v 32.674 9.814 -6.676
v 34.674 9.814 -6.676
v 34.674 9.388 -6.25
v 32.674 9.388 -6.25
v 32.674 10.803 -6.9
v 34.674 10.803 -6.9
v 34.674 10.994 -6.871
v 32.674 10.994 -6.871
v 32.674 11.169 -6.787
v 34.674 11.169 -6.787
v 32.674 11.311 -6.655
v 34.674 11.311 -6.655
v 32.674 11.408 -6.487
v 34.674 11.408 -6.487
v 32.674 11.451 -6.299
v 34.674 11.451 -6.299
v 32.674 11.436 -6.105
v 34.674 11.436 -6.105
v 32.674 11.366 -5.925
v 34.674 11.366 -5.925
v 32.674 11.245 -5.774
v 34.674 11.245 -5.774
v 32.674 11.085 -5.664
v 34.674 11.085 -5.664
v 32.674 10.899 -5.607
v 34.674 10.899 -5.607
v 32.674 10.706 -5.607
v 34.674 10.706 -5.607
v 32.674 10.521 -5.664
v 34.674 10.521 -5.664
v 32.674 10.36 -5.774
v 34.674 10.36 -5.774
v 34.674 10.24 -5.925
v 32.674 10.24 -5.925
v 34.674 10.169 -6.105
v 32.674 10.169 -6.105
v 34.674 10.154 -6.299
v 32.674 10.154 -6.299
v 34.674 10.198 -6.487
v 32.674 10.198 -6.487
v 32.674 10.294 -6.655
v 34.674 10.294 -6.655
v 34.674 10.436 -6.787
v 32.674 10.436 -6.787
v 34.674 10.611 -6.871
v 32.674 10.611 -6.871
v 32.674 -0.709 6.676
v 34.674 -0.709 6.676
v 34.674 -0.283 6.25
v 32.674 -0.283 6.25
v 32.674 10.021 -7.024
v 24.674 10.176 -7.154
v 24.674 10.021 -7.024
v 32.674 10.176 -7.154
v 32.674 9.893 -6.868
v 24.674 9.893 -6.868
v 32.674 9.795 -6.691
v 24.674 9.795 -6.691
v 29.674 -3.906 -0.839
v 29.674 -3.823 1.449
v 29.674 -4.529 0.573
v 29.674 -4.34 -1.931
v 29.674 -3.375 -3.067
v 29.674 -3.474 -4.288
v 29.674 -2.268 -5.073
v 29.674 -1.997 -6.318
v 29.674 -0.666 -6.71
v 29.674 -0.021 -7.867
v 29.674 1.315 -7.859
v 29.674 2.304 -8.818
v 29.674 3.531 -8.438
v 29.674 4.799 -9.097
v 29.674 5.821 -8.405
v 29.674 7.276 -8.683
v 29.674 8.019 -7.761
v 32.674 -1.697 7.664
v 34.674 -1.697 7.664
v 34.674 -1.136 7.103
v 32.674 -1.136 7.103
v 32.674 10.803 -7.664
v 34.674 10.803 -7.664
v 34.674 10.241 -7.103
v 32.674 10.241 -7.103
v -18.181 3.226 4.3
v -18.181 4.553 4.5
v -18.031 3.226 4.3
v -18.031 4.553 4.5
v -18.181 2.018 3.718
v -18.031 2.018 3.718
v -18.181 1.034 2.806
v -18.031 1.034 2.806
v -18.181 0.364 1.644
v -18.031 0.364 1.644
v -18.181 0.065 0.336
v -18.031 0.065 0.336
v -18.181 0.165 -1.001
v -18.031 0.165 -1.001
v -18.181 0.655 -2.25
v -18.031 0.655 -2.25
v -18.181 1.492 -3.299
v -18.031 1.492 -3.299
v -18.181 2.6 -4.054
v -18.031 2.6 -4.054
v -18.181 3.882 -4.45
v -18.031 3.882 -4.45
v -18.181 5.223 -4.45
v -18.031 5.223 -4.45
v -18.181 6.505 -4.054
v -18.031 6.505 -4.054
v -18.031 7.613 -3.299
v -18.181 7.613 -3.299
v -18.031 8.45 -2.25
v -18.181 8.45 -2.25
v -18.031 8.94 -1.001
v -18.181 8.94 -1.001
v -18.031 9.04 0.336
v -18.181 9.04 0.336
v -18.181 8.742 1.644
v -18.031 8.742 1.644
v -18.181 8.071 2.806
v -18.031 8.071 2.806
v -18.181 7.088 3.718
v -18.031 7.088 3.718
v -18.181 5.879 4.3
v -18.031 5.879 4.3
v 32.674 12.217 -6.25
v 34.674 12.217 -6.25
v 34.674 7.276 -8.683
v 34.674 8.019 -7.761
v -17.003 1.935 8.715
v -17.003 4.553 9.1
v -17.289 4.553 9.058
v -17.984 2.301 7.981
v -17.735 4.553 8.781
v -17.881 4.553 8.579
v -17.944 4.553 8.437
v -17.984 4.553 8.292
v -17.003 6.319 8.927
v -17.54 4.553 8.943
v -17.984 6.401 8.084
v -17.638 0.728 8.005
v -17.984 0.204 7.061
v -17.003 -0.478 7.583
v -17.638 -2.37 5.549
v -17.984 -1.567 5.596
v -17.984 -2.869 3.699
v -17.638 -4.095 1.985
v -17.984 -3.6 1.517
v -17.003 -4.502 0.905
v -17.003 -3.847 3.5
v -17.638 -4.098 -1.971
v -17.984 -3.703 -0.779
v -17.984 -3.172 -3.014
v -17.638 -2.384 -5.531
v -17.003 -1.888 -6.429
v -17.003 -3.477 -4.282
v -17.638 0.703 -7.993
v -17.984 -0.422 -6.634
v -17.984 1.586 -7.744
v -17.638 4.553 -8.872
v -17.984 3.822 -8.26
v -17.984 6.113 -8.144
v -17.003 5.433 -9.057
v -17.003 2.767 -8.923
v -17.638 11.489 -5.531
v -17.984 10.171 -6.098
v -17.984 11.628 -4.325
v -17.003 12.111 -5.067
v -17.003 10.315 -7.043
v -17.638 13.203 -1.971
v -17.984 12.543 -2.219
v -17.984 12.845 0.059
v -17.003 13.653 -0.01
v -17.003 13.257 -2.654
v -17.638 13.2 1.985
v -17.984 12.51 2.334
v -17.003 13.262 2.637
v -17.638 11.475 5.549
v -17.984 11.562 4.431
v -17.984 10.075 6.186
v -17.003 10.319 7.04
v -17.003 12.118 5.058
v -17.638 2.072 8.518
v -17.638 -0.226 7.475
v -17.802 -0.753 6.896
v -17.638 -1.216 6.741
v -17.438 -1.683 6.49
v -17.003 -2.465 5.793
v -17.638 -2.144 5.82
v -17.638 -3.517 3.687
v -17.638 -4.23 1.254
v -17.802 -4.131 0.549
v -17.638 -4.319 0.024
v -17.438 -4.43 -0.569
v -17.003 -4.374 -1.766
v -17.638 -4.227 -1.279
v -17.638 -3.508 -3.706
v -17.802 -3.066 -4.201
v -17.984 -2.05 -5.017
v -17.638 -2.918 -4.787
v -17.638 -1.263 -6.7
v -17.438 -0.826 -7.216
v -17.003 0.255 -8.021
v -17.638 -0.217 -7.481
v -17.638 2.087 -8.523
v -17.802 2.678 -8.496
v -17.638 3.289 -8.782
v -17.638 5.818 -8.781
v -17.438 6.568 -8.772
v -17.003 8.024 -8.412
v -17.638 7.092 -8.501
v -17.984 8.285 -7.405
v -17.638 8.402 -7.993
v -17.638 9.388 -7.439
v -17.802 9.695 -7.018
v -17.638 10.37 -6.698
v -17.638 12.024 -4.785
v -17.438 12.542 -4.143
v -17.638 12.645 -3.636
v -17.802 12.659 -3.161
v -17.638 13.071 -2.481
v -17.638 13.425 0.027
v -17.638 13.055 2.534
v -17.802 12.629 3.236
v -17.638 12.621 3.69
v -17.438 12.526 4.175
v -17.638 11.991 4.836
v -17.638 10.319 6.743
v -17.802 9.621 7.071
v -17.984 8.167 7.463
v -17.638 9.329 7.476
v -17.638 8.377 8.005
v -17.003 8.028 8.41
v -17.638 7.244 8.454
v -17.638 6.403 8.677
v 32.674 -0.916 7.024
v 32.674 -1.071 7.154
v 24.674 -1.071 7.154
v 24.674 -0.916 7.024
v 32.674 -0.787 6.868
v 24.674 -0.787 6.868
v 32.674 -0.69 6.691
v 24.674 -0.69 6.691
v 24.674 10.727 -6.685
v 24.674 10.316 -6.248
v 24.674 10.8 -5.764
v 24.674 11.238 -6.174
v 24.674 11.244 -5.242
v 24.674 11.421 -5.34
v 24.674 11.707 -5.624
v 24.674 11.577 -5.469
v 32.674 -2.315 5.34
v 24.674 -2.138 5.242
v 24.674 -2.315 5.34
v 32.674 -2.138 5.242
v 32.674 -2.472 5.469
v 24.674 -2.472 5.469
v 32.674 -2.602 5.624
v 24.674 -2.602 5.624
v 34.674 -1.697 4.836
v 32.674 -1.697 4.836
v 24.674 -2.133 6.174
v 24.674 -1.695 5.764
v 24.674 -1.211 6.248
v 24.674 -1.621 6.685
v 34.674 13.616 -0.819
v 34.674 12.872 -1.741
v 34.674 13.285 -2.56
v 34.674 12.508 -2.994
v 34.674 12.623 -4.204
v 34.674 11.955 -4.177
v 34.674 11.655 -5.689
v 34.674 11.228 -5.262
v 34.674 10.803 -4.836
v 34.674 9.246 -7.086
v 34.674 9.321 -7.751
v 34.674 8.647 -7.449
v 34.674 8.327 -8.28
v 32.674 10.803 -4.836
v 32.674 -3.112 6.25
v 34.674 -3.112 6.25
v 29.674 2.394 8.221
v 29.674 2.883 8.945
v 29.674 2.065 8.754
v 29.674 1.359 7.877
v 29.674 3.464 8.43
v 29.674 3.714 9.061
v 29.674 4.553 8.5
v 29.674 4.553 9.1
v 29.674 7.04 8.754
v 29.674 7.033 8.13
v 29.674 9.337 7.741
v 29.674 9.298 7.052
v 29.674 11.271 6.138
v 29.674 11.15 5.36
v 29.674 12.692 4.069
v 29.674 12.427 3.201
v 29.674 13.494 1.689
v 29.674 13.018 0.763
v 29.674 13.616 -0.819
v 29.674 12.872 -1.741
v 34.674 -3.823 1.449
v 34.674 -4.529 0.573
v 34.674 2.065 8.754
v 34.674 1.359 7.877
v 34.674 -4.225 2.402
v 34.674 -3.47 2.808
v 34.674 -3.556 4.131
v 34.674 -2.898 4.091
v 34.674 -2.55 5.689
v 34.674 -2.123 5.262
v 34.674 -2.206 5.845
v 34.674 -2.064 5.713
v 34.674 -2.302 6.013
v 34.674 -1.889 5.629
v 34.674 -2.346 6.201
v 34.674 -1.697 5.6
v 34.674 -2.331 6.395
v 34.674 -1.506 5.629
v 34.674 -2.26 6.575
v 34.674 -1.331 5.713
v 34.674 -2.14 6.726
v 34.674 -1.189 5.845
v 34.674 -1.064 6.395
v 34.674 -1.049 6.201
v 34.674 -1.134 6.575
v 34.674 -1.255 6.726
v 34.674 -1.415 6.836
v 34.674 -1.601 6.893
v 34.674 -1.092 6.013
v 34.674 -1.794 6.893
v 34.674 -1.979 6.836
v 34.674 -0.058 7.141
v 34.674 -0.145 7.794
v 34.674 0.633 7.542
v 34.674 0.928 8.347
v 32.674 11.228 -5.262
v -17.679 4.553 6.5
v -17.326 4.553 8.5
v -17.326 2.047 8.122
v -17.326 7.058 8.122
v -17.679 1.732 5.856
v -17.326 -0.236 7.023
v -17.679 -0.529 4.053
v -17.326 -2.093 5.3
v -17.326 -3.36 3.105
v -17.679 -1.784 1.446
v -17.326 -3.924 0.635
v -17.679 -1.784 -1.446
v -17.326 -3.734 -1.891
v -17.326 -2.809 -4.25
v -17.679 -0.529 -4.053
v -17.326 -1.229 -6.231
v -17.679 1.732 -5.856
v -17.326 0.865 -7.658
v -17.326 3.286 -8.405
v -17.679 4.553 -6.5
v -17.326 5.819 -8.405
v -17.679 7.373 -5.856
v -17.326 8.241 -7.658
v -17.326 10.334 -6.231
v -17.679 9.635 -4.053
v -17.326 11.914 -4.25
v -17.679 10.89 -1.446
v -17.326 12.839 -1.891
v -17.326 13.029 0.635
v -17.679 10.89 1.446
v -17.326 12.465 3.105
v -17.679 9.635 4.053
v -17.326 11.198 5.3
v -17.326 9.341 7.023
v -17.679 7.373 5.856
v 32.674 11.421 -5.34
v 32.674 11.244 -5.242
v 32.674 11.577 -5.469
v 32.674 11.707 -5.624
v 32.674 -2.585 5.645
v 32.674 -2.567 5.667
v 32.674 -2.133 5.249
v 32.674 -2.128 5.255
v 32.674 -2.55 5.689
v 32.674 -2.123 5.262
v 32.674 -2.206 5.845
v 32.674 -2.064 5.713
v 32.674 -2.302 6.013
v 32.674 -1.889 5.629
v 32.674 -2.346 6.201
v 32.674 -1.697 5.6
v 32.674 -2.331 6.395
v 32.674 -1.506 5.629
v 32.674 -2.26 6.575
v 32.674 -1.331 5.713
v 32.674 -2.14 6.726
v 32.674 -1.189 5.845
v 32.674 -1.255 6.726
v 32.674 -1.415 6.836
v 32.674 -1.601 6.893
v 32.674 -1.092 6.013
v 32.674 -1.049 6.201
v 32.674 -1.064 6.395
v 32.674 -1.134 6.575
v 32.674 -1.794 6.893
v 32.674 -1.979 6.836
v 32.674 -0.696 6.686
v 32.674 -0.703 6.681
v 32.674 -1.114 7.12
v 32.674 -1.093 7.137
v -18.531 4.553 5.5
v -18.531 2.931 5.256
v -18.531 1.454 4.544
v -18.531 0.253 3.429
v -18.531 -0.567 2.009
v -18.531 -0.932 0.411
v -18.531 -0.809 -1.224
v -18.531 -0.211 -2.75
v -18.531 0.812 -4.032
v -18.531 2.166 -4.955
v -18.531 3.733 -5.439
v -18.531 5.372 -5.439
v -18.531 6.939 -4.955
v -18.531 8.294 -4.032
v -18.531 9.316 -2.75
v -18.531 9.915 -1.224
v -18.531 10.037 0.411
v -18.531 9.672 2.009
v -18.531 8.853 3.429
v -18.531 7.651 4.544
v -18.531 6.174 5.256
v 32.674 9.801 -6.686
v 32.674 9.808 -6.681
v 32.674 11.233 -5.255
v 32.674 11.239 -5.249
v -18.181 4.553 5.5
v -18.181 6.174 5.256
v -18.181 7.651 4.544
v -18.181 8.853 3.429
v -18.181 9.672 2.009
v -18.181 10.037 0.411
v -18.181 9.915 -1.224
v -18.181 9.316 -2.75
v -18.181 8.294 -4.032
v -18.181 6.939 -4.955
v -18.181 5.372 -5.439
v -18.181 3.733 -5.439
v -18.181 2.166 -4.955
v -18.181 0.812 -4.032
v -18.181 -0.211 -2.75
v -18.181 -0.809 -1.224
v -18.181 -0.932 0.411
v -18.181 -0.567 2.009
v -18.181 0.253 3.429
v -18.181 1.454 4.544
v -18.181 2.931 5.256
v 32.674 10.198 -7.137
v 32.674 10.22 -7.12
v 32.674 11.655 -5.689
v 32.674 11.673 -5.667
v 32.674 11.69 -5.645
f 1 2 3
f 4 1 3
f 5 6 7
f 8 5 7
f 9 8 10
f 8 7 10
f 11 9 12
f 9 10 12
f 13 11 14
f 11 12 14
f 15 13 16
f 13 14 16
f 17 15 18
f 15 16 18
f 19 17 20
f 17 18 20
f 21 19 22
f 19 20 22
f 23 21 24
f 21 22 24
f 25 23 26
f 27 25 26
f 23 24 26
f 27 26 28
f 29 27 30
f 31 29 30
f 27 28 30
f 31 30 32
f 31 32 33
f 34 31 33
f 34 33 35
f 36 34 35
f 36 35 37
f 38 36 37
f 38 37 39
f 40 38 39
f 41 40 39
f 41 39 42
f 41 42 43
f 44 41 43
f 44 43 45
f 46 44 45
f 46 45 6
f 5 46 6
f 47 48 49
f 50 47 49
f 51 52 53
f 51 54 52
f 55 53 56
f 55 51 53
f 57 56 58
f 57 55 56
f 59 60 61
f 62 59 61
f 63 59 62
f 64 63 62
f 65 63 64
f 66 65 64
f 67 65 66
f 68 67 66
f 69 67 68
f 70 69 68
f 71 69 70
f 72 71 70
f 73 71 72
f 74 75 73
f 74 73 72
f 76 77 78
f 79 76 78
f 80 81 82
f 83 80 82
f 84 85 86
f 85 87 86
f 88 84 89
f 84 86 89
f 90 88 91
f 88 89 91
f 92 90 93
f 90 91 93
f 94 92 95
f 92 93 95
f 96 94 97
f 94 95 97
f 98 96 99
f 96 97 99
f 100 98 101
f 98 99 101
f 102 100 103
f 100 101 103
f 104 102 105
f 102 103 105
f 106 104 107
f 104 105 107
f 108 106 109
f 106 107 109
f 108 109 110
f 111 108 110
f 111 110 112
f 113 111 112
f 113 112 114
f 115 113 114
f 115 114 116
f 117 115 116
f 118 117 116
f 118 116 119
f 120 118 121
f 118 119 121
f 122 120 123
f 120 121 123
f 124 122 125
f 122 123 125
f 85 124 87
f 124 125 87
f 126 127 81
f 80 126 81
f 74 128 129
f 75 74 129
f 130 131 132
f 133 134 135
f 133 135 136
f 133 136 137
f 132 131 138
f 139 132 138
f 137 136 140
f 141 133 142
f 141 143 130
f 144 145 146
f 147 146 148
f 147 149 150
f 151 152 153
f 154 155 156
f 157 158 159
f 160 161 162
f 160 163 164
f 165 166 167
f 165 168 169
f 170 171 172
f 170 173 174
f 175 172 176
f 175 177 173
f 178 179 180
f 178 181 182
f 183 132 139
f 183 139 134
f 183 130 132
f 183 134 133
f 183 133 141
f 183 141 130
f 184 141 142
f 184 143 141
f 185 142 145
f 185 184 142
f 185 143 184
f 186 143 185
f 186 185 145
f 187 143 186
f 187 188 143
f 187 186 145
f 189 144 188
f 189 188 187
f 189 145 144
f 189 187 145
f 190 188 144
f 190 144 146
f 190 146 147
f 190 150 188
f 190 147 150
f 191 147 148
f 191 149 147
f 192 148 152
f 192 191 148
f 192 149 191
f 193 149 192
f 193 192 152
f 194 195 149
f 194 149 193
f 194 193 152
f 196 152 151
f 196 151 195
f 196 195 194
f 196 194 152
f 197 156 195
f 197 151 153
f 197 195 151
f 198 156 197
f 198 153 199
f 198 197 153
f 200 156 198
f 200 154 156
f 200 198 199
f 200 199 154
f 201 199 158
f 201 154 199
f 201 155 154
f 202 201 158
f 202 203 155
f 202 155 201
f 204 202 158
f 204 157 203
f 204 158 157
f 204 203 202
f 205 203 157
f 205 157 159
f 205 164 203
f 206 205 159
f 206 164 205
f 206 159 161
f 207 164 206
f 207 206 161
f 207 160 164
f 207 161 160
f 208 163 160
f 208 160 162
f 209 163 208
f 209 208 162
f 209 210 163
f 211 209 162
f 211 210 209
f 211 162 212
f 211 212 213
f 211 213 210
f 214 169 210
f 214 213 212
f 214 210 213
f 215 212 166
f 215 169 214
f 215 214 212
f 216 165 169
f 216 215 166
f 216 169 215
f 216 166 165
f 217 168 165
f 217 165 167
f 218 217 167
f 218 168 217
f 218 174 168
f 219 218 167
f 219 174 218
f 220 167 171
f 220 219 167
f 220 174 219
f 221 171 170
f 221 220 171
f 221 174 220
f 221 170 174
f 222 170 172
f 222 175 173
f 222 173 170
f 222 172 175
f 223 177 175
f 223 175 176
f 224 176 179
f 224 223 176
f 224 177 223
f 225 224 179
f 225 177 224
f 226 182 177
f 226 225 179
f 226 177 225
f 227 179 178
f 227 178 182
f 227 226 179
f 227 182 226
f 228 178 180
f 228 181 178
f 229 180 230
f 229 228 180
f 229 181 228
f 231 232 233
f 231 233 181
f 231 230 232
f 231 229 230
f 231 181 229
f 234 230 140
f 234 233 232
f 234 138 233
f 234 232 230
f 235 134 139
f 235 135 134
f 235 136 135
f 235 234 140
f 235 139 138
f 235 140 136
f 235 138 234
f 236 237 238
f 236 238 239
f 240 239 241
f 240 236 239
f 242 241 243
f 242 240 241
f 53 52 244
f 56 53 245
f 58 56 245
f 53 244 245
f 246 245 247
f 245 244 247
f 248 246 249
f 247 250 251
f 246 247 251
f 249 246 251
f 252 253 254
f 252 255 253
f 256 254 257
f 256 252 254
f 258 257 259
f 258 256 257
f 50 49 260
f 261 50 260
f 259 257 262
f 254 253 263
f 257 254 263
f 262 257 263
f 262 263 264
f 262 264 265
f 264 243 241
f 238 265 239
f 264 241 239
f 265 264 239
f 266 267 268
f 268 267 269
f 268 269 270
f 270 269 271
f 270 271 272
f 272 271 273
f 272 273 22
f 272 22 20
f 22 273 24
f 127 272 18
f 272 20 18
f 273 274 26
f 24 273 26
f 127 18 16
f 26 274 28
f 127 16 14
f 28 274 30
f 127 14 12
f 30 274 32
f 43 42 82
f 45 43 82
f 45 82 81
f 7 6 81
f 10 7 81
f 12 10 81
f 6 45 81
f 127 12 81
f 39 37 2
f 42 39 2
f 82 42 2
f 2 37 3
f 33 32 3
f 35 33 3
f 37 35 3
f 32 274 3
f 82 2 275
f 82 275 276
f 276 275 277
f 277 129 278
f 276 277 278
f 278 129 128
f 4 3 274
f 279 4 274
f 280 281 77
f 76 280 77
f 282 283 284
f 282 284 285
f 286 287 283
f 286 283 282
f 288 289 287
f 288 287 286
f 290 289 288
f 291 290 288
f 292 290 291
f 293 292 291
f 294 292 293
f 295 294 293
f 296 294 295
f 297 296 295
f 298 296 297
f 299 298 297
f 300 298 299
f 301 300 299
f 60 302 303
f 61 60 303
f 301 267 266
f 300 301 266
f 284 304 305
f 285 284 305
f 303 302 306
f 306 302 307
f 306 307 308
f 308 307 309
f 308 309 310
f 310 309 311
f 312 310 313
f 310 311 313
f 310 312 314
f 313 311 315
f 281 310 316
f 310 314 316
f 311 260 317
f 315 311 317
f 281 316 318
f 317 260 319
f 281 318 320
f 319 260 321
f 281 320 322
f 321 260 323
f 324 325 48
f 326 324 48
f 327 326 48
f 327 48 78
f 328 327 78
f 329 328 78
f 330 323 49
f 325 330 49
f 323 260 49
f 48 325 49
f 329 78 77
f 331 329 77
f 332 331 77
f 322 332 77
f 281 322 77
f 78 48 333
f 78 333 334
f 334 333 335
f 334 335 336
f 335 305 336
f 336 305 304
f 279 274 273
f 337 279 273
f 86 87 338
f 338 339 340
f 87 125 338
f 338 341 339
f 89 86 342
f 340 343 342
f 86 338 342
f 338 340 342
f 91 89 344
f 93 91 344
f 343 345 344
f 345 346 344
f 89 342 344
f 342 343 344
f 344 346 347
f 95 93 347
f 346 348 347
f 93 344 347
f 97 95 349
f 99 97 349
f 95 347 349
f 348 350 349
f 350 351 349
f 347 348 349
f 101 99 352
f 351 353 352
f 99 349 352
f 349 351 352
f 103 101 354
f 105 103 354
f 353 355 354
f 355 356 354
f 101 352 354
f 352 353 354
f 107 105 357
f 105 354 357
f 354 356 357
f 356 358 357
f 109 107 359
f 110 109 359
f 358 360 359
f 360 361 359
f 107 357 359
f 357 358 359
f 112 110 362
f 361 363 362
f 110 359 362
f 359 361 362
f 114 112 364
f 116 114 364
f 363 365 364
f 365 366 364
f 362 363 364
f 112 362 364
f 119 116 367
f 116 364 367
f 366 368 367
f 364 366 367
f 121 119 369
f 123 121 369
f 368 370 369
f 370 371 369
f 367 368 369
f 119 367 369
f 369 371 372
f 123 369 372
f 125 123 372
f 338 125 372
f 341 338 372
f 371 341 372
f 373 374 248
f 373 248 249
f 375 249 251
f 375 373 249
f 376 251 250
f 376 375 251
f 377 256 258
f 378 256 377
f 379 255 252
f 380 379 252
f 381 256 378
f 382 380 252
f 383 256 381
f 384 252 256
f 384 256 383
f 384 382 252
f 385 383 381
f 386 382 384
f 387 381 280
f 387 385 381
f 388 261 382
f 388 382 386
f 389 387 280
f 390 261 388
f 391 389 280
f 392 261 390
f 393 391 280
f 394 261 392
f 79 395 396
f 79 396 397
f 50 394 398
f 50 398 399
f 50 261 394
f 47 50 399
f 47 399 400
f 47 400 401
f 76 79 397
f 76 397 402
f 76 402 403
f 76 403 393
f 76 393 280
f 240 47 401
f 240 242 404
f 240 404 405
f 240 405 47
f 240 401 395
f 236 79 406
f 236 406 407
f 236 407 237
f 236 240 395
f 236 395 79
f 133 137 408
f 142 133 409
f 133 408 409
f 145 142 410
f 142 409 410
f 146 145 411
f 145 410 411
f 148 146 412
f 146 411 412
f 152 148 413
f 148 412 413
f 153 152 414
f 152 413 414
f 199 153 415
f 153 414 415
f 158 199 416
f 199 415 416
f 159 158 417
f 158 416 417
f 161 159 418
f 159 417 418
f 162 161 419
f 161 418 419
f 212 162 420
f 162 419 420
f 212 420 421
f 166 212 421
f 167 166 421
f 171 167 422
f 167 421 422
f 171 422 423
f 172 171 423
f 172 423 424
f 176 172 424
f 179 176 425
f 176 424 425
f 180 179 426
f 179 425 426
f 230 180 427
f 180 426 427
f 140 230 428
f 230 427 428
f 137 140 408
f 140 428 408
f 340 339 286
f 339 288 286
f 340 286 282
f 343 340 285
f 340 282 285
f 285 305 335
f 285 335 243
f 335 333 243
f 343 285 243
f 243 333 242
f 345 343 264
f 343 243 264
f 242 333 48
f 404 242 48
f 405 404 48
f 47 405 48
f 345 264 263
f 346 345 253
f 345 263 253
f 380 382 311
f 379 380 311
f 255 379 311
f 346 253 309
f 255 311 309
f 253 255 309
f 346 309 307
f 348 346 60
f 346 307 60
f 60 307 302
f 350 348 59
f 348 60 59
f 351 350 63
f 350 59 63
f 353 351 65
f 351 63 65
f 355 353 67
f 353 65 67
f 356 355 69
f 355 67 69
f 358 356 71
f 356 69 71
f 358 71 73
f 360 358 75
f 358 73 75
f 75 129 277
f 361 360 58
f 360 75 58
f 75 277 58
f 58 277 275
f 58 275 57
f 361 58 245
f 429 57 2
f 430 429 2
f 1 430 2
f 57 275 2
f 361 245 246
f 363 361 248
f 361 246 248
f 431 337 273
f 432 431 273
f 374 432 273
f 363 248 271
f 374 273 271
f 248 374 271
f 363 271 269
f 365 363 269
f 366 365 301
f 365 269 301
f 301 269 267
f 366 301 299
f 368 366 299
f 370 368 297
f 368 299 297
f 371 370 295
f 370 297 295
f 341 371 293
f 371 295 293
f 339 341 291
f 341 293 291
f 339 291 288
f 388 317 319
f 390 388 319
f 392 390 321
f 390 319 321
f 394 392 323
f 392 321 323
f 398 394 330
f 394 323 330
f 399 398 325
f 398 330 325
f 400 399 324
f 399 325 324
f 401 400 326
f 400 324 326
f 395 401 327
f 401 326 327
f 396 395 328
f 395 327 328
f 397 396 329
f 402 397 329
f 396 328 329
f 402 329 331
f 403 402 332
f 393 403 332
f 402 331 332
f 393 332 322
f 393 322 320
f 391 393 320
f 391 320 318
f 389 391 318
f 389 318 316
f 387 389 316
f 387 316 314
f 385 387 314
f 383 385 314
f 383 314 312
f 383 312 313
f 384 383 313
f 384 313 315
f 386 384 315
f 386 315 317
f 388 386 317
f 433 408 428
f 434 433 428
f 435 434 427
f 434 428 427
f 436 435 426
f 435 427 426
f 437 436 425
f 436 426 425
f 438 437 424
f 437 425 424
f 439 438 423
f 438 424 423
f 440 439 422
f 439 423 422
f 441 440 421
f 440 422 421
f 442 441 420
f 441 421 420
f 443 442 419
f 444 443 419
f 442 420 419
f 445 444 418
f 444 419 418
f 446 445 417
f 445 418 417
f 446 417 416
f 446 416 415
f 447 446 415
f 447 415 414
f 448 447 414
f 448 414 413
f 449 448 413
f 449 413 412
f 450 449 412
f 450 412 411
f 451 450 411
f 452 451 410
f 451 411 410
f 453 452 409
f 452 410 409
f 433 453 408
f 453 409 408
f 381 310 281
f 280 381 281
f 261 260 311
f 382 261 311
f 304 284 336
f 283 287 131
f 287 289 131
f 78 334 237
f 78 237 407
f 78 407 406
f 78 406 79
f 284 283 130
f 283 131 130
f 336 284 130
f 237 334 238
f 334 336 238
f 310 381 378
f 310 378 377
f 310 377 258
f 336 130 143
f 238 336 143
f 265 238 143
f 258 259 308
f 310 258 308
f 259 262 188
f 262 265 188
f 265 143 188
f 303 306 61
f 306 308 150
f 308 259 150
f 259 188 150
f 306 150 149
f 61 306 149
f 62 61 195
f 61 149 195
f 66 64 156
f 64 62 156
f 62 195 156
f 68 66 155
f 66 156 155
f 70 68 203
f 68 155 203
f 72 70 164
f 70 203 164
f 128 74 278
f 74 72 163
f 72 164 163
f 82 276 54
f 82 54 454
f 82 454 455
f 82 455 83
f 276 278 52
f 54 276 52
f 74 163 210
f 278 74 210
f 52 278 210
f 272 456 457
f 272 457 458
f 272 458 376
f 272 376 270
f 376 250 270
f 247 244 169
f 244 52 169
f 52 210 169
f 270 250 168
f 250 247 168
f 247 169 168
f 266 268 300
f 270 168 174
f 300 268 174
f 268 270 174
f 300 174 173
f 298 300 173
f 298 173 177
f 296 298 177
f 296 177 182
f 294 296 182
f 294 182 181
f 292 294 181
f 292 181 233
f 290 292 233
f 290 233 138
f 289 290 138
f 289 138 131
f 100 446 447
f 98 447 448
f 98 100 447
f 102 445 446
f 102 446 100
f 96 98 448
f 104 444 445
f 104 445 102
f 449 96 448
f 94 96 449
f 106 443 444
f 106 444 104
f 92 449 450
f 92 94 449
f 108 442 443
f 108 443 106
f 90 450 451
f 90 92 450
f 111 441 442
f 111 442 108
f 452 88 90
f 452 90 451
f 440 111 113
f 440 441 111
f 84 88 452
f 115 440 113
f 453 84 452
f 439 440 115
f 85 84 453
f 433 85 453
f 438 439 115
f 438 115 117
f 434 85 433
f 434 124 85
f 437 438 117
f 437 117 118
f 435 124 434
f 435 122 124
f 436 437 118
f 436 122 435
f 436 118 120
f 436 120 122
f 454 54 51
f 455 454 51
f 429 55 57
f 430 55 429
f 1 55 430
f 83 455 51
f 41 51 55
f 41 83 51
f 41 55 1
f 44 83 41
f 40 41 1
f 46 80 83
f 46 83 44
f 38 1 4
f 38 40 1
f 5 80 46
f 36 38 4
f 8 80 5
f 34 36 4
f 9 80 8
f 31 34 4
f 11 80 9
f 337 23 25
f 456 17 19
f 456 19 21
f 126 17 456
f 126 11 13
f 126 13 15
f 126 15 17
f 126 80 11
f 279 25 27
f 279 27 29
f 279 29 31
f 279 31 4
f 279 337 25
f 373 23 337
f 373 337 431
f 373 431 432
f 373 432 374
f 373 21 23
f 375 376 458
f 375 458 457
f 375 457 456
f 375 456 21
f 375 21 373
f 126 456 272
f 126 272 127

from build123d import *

# Parameters (mm, degrees)
FILLET1_R           = 1
SKETCH3_R           = 5.5
CUT_EXTRUDE1_DEPTH  = 0.35
CUT_EXTRUDE2_DEPTH  = 5
BOSS_EXTRUDE2_DEPTH = 2
SKETCH5_R           = 0.65
CUT_EXTRUDE3_DEPTH  = 5
SKETCH7_R           = 1.1
CUT_EXTRUDE4_DEPTH  = 8


with BuildPart() as part:
    # Sketch1 → Revolve1 (revolve)
    with BuildSketch(Plane.XY, mode=Mode.PRIVATE) as revolve1_sk:
        Polygon((-17.325922144, -3.94739572), (34.674077856, -3.94739572), (34.674077856, -4.54739572), (-17.825922144, -4.54739572), (-18.531230067, -0.94739572), (-18.531230067, 0.05260428), (-18.031230067, 0.05260428), align=None)
    revolve(revolve1_sk.sketch.rotate(Axis((-18.92728318, 4.55260428, 0), (1, 0, 0)), 270), axis=Axis((-18.92728318, 4.55260428, 0), (1, 0, 0)))

    # Fillet1
    fillet1_edges = [part.edges().sort_by_distance(p)[0] for p in [
        (-17.825922144, 4.55260428, -9.1),
    ]]
    fillet(fillet1_edges, radius=FILLET1_R)

    # Sketch3 → Cut-Extrude1 (cut)
    with BuildSketch(Plane.ZY.offset(18.531230067)):
        with Locations((0, 4.55260428)):
            Circle(SKETCH3_R)
    extrude(amount=-CUT_EXTRUDE1_DEPTH, mode=Mode.SUBTRACT)

    # Sketch4 → Cut-Extrude2 (cut)
    with BuildSketch(Plane(origin=(34.674077856, 0, 0), x_dir=(0, 0, -1), z_dir=(1, 0, 0))):
        Polygon((-13.628095951, 5.995190129), (5.056342646, -9.067736356), (14.470671699, 2.610037767), (-4.213766898, 17.672964252), align=None)
    extrude(amount=-CUT_EXTRUDE2_DEPTH, mode=Mode.SUBTRACT)

    # Sketch6 → Boss-Extrude2 (add)
    with BuildSketch(Plane(origin=(34.674077856, 0, 0), x_dir=(0, 0, -1), z_dir=(1, 0, 0))):
        Polygon((-6.25, -0.283182158), (-4.835786438, -1.69739572), (-6.25, -3.111609282), (-7.664213562, -1.69739572), align=None)
        Polygon((4.835786438, 10.80260428), (6.25, 12.216817842), (7.664213562, 10.80260428), (6.25, 9.388390718), align=None)
    extrude(amount=-BOSS_EXTRUDE2_DEPTH)

    # Sketch5 → Cut-Extrude3 (cut)
    with BuildSketch(Plane(origin=(34.674077856, 0, 0), x_dir=(0, 0, -1), z_dir=(1, 0, 0))):
        with Locations((6.25, 10.80260428)):
            Circle(SKETCH5_R)
        with Locations((-6.25, -1.69739572)):
            Circle(SKETCH5_R)
    extrude(amount=-CUT_EXTRUDE3_DEPTH, mode=Mode.SUBTRACT)

    # Sketch7 → Cut-Extrude4 (cut)
    with BuildSketch(Plane.ZY.offset(-32.674077856)):
        with Locations((6.25, -1.69739572)):
            Circle(SKETCH7_R)
        with Locations((-6.25, 10.80260428)):
            Circle(SKETCH7_R)
    extrude(amount=CUT_EXTRUDE4_DEPTH, mode=Mode.SUBTRACT)


solid = part.part
